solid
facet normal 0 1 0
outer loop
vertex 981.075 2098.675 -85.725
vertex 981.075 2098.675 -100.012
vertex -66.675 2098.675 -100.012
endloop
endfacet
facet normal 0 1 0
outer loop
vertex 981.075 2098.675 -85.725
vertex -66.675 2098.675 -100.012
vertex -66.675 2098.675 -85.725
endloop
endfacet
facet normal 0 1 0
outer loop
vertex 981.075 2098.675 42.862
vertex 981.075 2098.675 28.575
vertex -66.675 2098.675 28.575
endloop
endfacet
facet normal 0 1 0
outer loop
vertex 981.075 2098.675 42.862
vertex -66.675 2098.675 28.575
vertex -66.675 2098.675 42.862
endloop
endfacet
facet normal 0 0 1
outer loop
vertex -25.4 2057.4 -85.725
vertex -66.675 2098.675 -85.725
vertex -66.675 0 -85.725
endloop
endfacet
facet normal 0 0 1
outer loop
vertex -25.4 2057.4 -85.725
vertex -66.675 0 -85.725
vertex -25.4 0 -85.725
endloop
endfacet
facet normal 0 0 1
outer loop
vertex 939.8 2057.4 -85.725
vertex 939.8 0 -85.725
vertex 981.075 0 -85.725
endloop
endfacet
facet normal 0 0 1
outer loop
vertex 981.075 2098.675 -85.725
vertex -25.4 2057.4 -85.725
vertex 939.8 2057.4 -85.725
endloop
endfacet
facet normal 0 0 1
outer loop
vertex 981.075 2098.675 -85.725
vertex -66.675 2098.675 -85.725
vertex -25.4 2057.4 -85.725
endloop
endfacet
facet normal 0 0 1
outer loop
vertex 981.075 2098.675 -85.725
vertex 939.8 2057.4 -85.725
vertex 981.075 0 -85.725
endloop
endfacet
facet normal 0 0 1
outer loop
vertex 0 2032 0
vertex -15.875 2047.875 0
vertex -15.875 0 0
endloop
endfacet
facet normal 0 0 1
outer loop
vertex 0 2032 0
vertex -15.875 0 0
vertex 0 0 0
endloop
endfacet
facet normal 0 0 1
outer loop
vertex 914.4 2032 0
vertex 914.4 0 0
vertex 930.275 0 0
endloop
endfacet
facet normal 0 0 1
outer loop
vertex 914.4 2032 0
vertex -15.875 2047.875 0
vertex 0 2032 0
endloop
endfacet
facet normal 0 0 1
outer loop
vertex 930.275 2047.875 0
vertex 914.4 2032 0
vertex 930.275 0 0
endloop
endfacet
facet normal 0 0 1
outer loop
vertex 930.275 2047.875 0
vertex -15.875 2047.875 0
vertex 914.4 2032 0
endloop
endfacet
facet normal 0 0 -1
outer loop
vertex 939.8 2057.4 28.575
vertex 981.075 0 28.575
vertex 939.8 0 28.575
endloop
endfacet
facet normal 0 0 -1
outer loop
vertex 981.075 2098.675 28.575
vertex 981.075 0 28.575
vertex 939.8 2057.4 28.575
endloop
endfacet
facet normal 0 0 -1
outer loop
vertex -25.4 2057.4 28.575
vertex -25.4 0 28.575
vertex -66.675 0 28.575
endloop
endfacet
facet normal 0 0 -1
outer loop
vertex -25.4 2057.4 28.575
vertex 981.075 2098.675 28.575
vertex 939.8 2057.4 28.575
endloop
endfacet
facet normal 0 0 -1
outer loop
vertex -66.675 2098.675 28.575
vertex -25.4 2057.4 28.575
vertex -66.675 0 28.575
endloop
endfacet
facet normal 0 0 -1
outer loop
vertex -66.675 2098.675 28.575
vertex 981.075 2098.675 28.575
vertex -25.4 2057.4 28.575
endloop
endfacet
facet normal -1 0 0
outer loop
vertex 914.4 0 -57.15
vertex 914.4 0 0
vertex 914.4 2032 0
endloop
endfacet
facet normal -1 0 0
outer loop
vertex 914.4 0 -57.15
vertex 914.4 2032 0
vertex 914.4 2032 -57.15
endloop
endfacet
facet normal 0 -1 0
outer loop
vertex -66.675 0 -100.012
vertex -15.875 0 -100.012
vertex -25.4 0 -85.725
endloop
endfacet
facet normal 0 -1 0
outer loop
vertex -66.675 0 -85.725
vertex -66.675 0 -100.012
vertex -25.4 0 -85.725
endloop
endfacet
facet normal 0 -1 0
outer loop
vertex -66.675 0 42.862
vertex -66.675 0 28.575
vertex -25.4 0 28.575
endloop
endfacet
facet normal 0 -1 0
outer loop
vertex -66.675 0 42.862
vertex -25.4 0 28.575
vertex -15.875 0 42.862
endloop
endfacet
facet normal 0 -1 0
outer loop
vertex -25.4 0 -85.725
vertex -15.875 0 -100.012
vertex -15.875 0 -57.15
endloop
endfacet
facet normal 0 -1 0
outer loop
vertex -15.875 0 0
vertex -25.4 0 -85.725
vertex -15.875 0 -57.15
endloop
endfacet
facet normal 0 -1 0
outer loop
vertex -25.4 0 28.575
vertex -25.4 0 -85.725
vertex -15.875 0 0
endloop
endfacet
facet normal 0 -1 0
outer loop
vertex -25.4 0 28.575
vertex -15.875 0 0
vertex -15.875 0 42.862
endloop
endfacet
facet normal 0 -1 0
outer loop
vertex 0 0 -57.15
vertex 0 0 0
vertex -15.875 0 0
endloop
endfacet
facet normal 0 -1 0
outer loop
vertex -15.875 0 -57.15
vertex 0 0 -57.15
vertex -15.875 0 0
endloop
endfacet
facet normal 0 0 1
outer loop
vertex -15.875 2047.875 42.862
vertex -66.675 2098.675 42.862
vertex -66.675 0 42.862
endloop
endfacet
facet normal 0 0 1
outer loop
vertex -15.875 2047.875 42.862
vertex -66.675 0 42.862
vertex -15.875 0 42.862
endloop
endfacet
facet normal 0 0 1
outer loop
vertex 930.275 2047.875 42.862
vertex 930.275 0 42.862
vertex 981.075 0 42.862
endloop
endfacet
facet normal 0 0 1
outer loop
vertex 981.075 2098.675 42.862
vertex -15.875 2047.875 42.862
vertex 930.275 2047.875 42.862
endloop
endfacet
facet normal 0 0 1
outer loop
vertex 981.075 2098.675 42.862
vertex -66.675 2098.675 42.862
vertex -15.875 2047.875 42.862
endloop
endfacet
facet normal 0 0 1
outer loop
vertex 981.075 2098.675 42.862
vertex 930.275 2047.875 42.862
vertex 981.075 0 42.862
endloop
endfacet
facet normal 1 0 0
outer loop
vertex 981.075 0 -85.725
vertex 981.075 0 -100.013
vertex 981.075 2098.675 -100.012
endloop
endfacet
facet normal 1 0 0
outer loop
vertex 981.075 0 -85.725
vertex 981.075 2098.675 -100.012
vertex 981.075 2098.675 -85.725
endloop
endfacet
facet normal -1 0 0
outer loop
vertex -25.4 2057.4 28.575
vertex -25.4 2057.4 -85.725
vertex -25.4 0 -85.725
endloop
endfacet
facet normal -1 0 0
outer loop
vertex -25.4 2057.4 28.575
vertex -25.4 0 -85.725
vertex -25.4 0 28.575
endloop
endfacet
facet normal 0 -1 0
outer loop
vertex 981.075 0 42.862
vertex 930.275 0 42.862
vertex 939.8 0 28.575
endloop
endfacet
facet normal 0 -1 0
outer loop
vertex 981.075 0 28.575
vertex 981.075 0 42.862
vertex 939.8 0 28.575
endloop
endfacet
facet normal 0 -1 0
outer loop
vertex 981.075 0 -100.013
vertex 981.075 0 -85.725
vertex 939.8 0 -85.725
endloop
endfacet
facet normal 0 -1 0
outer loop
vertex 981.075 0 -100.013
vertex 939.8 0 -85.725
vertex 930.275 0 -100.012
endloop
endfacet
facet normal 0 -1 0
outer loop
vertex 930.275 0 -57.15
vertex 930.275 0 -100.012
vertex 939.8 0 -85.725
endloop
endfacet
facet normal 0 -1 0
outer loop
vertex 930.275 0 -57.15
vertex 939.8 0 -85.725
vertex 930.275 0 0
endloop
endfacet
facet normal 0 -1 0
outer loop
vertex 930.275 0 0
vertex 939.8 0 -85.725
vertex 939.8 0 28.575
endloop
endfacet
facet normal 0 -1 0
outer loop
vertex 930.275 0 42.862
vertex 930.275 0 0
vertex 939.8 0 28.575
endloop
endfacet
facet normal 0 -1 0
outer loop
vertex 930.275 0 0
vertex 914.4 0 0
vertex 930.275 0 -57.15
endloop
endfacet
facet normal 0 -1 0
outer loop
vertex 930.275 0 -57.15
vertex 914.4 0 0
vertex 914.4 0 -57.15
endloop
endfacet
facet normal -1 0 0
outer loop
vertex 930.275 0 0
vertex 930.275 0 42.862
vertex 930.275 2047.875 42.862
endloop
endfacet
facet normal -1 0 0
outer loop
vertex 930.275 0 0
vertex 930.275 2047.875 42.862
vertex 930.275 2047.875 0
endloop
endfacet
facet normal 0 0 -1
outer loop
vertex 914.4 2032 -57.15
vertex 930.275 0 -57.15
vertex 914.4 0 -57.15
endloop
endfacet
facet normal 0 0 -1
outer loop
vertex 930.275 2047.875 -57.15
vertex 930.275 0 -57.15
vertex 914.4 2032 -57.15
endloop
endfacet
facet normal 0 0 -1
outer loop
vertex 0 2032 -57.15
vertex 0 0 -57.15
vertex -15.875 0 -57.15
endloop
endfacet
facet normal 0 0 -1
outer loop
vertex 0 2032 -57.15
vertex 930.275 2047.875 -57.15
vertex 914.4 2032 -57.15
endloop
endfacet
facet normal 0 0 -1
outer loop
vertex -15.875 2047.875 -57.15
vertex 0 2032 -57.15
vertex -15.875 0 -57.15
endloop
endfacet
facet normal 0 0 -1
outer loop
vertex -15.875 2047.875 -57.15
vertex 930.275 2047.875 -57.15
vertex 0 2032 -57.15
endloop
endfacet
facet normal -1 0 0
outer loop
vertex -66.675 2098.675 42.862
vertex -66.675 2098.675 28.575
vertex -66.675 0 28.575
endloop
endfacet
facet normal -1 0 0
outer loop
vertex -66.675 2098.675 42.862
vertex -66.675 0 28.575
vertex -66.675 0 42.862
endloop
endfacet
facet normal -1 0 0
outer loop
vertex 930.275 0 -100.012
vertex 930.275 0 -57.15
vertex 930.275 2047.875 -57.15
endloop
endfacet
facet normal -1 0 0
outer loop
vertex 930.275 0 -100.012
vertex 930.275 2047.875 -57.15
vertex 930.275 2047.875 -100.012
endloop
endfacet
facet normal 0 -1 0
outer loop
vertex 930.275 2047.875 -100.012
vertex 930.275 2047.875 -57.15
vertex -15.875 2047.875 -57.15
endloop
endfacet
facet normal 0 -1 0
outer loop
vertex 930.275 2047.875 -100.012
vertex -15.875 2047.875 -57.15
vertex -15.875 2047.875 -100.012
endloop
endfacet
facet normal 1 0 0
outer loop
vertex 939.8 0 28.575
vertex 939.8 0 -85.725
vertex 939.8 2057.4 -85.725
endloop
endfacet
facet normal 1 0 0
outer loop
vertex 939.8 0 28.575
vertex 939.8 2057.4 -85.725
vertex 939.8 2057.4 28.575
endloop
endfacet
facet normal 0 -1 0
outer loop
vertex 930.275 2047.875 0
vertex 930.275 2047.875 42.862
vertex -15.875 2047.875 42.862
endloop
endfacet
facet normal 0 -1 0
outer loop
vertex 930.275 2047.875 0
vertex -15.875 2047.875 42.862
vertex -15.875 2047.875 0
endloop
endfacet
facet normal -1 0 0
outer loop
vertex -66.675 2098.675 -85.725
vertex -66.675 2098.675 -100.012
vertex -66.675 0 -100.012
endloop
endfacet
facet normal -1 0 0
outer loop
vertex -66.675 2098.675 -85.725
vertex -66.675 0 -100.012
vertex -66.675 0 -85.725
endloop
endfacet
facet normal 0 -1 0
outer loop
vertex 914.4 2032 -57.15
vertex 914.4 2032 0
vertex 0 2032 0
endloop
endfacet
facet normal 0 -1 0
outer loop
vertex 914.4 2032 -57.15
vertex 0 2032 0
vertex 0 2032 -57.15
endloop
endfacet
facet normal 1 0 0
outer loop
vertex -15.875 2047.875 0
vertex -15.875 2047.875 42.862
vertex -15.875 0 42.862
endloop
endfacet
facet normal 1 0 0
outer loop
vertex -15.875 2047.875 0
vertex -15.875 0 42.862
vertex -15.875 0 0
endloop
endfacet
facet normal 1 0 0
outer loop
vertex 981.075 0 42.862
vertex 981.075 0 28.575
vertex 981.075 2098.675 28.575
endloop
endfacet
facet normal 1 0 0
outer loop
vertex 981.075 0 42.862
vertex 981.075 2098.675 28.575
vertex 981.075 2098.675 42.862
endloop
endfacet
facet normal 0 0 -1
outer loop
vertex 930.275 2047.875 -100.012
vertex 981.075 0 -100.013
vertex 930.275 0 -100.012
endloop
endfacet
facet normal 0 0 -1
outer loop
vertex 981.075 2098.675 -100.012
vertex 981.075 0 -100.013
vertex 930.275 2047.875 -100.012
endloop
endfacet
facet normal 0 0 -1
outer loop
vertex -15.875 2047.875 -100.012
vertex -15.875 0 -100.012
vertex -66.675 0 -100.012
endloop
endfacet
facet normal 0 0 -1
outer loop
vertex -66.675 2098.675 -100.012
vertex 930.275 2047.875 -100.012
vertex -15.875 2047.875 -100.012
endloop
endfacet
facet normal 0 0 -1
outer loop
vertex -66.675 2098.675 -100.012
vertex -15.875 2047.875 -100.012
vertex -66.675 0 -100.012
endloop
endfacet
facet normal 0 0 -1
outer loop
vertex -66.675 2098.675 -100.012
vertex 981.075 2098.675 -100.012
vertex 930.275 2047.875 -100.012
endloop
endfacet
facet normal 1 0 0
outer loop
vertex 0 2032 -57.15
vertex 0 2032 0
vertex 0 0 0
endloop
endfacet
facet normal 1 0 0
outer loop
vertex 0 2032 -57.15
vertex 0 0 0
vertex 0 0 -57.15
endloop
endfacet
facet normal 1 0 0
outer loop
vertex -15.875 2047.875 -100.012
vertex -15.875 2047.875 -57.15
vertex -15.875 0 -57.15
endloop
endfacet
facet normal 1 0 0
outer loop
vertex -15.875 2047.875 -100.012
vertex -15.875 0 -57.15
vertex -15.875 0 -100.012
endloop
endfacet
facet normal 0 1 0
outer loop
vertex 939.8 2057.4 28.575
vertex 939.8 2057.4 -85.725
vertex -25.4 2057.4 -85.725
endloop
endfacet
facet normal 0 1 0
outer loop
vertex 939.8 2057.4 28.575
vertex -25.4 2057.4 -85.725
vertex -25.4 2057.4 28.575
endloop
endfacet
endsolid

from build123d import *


with BuildPart() as part:
    # Sweep1: sweep along a path in Sketch1
    with BuildLine(Plane.XY) as sweep1_path:
        Line((0, 0), (0, 2032))
        Line((0, 2032), (914.4, 2032))
        Line((914.4, 2032), (914.4, 0))
    # Sketch2 → Sweep1 (sweep)
    with BuildSketch(Plane(origin=(0, 0, 0), x_dir=(1, 0, 0), z_dir=(0, 1, 0))):
        Polygon((0, 0), (0, 57.15), (-15.875, 57.15), (-15.875, 100.0125), (-66.675, 100.0125), (-66.675, 85.725), (-25.4, 85.725), (-25.4, -28.575), (-66.675, -28.575), (-66.675, -42.8625), (-15.875, -42.8625), (-15.875, 0), align=None)
    sweep(path=sweep1_path.line, transition=Transition.RIGHT)


solid = part.part
